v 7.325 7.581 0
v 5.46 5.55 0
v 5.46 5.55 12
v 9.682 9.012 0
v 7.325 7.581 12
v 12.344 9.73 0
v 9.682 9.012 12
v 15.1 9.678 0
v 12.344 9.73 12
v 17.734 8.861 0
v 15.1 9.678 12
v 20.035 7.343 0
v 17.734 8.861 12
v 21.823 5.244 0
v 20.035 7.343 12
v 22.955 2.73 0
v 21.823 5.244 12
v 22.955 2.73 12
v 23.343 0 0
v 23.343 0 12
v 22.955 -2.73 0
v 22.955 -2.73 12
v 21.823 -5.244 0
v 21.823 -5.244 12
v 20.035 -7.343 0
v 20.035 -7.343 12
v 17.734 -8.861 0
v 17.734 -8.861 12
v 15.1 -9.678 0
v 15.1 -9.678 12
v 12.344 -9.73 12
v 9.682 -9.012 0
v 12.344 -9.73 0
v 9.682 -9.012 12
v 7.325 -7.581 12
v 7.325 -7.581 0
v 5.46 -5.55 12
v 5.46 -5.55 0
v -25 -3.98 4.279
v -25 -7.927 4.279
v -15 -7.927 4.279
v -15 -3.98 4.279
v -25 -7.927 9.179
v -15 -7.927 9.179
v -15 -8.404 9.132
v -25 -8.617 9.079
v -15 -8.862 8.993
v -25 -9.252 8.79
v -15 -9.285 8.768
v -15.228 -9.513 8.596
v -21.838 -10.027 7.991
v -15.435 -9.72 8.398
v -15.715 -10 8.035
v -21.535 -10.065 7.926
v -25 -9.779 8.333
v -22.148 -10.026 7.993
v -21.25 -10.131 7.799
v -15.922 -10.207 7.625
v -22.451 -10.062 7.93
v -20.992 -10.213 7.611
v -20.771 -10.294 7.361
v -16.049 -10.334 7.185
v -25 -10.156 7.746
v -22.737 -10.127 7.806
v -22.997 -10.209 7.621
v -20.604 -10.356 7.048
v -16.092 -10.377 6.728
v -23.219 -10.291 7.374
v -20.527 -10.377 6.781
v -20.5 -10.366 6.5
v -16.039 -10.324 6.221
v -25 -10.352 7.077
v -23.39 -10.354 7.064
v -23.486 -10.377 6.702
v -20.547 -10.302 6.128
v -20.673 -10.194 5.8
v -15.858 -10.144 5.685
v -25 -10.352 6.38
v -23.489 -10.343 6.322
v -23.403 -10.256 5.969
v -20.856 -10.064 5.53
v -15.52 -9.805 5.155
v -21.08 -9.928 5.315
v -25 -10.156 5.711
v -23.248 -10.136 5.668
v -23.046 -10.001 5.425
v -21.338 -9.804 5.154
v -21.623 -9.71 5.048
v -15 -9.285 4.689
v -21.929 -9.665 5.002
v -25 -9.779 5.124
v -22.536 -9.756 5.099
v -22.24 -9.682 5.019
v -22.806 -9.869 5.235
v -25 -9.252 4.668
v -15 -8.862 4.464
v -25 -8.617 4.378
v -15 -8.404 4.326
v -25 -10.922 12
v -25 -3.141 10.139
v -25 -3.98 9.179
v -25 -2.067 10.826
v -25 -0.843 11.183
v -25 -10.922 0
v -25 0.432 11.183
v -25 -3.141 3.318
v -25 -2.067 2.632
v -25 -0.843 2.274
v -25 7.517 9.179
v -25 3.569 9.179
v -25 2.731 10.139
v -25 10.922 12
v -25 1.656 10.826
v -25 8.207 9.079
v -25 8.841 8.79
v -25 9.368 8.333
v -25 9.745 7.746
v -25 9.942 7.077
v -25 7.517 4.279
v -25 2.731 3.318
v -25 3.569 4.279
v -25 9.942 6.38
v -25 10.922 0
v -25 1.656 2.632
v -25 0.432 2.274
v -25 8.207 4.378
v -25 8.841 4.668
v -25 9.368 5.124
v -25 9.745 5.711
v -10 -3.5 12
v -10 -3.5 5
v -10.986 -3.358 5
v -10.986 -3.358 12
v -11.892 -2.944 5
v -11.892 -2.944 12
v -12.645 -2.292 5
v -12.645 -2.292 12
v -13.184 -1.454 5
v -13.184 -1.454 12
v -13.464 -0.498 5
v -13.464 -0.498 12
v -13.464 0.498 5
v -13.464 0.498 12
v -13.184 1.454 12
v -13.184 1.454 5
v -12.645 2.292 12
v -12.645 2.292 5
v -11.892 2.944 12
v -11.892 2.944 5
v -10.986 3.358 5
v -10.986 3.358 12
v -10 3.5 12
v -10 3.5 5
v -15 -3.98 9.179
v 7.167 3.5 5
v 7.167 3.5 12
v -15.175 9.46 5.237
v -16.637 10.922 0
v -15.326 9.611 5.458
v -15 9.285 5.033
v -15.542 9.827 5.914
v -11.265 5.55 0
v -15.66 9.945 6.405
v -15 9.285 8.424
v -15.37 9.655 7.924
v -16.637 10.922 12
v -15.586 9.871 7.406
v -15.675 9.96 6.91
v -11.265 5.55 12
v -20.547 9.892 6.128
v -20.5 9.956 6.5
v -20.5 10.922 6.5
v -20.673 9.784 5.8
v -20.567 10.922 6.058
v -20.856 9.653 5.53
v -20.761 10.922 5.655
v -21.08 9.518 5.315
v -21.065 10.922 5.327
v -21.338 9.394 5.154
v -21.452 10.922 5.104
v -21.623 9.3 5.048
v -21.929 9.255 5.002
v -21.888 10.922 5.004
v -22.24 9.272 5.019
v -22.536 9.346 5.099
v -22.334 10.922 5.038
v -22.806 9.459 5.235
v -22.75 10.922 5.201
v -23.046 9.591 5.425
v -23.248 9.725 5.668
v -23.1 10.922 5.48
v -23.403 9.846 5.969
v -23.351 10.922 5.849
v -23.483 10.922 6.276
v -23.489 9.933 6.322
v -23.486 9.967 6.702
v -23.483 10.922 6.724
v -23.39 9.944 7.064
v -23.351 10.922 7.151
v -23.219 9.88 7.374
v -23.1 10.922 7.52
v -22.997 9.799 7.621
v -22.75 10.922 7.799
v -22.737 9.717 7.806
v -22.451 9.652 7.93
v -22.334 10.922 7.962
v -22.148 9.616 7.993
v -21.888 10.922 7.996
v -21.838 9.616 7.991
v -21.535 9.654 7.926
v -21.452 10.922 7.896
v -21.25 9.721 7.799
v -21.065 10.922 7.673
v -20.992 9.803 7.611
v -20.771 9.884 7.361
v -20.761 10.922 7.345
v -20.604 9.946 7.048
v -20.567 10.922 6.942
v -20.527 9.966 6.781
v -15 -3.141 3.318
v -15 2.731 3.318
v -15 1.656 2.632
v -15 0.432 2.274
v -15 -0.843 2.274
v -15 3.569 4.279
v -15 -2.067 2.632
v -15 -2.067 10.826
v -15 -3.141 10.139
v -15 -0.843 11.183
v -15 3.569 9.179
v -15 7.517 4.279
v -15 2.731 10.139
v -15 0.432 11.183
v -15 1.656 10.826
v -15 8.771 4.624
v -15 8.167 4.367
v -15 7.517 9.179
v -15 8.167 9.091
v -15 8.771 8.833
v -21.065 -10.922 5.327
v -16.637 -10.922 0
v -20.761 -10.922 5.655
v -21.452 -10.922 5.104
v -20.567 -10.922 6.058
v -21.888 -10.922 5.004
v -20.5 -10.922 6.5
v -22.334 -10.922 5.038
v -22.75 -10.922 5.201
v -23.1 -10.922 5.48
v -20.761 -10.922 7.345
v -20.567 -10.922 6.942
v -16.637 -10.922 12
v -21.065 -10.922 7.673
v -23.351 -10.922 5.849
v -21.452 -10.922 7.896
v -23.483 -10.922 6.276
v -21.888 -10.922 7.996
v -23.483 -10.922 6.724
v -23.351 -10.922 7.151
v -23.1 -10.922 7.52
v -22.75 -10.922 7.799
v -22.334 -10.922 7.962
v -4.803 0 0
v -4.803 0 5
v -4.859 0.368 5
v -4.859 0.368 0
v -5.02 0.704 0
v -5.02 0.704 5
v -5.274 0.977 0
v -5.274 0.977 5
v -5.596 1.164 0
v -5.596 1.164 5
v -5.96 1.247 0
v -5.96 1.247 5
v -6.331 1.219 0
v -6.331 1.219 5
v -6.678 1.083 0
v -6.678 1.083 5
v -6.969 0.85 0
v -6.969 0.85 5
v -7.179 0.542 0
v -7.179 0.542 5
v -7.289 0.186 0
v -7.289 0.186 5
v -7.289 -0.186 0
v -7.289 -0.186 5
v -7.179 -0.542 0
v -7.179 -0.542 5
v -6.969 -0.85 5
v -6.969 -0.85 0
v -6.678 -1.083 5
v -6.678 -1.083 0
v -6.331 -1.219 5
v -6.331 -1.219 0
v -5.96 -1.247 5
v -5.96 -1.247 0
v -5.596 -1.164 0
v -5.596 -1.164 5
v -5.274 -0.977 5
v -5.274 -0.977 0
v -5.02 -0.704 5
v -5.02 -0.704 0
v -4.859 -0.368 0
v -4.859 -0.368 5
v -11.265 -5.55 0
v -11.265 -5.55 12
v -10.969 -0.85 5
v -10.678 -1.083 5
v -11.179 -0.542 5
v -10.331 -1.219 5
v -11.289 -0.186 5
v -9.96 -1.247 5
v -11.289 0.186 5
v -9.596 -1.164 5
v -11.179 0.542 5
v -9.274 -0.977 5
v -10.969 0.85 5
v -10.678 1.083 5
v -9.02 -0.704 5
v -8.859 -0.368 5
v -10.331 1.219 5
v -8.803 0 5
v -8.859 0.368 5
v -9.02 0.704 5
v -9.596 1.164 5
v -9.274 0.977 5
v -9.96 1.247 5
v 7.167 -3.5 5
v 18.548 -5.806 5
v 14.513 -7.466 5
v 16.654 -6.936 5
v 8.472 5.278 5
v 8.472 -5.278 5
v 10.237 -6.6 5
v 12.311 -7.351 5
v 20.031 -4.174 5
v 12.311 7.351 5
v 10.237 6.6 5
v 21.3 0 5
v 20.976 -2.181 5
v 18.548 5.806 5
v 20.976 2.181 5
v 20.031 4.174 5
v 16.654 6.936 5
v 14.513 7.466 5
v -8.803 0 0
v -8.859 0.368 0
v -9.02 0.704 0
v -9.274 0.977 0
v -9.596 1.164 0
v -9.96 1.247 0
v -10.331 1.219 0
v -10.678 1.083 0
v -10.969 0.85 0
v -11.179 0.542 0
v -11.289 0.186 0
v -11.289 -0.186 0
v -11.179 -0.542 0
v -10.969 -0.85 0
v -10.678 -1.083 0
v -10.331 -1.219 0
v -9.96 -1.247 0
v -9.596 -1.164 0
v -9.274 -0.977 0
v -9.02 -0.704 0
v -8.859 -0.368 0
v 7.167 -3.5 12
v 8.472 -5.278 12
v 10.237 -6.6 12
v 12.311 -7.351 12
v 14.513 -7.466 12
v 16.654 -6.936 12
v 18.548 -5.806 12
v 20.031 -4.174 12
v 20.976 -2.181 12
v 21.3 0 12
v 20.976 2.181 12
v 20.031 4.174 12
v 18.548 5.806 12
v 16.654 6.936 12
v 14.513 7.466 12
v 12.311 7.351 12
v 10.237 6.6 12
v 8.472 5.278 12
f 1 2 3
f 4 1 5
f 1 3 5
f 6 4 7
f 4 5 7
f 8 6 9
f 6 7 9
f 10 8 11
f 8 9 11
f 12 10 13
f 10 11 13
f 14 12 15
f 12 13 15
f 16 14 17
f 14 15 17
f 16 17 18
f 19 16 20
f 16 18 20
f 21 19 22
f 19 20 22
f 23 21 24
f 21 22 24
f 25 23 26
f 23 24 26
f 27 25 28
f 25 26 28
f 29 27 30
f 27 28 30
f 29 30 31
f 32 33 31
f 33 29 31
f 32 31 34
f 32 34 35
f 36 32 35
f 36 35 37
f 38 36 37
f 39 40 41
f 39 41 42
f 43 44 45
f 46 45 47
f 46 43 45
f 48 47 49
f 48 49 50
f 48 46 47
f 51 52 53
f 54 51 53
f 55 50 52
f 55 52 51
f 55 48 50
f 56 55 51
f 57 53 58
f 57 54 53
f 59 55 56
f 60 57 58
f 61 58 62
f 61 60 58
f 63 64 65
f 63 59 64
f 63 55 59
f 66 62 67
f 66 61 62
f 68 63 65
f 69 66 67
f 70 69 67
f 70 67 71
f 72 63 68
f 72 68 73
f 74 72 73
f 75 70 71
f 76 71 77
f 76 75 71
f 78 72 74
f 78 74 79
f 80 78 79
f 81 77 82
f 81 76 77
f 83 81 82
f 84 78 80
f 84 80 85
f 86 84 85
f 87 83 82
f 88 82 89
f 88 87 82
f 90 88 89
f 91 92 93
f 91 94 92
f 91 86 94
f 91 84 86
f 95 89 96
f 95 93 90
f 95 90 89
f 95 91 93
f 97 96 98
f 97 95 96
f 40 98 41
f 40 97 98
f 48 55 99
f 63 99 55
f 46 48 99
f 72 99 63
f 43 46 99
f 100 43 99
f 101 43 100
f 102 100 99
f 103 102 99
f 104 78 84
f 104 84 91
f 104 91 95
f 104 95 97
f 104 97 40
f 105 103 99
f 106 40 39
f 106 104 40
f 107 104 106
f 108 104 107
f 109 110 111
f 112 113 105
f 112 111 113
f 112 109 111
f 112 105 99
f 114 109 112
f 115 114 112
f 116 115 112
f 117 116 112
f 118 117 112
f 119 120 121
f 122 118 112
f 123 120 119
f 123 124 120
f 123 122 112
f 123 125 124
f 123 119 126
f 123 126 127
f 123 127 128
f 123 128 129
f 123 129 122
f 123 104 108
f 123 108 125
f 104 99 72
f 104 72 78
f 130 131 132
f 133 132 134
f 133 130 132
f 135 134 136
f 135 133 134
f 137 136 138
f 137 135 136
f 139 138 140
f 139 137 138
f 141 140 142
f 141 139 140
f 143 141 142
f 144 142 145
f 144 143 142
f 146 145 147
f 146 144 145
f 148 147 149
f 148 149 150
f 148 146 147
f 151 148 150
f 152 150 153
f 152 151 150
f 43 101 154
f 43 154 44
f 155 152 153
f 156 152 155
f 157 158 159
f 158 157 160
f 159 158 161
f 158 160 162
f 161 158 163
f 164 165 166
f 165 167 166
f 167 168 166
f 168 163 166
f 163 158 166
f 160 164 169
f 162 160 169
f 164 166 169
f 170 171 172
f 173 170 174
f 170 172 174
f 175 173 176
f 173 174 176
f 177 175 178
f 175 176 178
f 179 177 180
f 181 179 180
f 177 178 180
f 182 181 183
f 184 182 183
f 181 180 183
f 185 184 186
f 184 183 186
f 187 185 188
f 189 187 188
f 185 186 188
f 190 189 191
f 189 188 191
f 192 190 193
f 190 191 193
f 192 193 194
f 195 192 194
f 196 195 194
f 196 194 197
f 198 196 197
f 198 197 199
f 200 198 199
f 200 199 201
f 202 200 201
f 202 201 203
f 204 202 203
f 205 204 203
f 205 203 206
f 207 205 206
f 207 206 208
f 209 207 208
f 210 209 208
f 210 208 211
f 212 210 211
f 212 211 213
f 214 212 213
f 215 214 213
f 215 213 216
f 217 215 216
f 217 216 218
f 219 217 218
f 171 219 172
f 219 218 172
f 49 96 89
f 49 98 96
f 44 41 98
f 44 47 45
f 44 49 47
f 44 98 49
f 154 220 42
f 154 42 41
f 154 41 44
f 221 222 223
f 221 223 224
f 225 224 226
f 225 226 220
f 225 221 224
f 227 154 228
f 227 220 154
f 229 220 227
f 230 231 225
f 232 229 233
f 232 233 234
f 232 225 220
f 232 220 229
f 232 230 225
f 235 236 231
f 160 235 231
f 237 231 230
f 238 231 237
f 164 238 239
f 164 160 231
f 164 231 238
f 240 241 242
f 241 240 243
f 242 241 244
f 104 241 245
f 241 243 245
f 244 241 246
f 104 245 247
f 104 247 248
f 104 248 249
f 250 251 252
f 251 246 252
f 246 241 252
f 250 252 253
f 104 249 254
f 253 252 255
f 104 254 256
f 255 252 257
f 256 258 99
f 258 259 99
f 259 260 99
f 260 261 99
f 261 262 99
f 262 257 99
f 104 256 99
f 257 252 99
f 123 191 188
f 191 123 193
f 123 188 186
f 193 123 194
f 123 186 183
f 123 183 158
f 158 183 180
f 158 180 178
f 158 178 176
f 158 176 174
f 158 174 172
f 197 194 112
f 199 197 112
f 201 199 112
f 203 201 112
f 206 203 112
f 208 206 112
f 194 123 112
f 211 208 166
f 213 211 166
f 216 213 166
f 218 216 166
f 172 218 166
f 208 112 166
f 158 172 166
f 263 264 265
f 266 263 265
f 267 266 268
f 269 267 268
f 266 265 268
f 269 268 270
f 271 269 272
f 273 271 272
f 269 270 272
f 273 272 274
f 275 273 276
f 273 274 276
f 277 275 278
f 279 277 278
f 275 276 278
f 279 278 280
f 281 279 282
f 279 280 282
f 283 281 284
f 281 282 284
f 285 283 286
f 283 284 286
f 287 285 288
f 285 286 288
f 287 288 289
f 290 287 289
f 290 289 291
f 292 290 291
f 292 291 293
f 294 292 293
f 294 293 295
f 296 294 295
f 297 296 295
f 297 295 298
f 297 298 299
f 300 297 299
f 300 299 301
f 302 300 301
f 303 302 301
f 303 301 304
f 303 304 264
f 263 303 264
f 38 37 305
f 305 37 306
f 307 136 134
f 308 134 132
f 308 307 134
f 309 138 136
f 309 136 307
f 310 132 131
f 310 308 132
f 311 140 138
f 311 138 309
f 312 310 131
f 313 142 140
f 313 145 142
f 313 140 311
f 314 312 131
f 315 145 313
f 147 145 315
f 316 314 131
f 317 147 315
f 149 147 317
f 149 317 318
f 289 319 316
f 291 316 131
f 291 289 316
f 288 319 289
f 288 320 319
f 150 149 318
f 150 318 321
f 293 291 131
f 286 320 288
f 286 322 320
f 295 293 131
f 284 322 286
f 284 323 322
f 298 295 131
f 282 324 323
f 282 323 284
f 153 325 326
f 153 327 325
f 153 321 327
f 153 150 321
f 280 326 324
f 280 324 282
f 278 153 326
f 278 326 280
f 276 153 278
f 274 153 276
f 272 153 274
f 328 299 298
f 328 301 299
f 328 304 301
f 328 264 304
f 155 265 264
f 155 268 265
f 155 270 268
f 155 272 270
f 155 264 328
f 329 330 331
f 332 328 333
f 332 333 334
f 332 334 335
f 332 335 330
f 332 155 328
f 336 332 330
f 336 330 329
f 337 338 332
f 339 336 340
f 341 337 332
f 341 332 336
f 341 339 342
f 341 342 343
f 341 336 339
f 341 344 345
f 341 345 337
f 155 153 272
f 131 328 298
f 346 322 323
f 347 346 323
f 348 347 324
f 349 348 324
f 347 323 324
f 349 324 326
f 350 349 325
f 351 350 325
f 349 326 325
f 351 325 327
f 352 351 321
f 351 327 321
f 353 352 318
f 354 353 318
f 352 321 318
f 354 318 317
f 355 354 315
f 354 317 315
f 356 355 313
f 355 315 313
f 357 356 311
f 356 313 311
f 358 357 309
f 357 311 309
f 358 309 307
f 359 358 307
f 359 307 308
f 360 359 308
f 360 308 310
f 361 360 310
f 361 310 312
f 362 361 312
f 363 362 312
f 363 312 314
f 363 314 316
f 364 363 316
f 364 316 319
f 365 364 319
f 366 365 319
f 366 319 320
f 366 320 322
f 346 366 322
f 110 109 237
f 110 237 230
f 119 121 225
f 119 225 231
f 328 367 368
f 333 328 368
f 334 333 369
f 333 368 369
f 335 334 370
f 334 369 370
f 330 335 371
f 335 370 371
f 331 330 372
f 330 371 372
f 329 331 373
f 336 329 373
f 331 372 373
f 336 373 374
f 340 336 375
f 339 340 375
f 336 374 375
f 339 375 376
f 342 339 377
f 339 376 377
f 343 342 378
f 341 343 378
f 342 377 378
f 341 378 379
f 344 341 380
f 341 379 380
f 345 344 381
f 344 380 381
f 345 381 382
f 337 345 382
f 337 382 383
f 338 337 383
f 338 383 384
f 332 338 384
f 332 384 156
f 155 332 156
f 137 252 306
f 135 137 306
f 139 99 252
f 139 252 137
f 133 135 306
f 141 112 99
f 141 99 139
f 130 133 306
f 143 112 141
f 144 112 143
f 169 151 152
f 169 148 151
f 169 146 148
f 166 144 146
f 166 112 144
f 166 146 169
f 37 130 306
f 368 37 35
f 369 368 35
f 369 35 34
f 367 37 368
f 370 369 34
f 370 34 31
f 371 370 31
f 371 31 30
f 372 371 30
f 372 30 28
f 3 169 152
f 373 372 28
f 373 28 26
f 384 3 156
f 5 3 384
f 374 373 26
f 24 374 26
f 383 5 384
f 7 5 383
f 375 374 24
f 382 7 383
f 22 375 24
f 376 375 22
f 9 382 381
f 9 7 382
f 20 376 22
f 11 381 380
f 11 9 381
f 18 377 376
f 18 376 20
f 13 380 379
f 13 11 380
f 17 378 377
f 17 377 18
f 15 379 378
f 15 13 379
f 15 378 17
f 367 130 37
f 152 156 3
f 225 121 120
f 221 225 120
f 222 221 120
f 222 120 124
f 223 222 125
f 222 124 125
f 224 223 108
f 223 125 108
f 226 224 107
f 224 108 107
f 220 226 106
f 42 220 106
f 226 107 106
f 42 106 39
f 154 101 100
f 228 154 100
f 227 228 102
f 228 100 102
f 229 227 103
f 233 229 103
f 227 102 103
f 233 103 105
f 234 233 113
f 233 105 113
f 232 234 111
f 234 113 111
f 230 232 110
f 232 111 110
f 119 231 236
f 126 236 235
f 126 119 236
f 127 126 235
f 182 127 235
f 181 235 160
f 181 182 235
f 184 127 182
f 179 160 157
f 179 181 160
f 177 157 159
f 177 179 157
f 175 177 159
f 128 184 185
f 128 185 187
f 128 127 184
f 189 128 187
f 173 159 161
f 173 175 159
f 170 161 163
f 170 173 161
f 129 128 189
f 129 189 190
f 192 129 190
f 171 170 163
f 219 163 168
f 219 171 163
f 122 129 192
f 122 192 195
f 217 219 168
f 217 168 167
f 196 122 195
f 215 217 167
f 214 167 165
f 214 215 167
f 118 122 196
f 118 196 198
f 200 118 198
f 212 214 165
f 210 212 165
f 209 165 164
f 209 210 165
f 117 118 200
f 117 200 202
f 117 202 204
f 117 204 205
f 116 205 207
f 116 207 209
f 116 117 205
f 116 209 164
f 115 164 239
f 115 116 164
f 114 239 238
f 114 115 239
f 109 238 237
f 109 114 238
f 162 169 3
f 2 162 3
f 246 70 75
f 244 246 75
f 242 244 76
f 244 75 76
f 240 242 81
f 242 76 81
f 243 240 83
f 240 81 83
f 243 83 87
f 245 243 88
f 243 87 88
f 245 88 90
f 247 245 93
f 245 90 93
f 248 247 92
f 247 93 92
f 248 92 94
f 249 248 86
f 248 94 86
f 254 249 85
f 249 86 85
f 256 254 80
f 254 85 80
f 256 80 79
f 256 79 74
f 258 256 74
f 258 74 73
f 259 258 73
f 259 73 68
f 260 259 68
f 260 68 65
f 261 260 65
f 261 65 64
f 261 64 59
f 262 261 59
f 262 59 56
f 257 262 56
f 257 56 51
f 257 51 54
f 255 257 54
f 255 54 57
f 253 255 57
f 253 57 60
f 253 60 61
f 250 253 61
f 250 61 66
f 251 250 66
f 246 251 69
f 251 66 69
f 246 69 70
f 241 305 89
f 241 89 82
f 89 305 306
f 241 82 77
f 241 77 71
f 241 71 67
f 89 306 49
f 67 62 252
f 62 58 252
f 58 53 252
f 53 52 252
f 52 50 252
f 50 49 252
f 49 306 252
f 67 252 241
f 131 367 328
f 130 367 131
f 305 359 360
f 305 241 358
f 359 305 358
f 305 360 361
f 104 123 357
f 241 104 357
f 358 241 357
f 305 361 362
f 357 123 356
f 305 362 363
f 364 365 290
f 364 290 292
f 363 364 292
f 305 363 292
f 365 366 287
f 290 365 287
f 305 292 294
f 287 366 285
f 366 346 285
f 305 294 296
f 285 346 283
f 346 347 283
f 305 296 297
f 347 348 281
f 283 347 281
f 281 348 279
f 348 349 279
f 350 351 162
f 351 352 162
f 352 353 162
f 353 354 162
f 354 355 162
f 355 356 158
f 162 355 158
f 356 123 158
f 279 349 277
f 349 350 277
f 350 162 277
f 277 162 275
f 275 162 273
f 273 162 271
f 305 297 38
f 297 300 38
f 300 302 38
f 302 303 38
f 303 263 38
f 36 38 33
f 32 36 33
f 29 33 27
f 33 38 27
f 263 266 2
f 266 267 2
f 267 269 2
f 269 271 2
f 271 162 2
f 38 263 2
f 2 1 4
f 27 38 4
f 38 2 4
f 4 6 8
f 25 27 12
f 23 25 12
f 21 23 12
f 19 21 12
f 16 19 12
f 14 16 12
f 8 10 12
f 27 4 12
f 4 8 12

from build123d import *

# Parameters (mm, degrees)
SKETCH1_W           = 50
SKETCH1_H           = 30
BOSS_EXTRUDE1_DEPTH = 15
SKETCH2_R           = 4.5
CUT_EXTRUDE1_DEPTH  = 10
SKETCH4_R           = 7.5
CUT_EXTRUDE3_DEPTH  = 10
SKETCH5_R           = 1.25
CUT_EXTRUDE4_DEPTH  = 10
SKETCH7_W           = 50
SKETCH7_H           = 30
CUT_EXTRUDE5_DEPTH  = 3
CUT_EXTRUDE6_DEPTH  = 13
SKETCH9_R           = 1.5
CUT_EXTRUDE7_DEPTH  = 23


with BuildPart() as part:
    # Sketch1 → Boss-Extrude1 (new body)
    with BuildSketch(Plane.XY):
        Rectangle(SKETCH1_W, SKETCH1_H)
    extrude(amount=BOSS_EXTRUDE1_DEPTH)

    # Sketch2 → Cut-Extrude1 (cut)
    with BuildSketch(Plane.ZY.offset(25)):
        with Locations((6.728688525, -0.205173042)):
            Circle(SKETCH2_R)
        with BuildLine():
            Line((9.178688525, 7.516794171), (9.178688525, -7.927140255))
            ThreePointArc((9.178688525, -7.927140255), (6.728688525, -10.377140255), (4.278688525, -7.927140255))
            Line((4.278688525, -7.927140255), (4.278688525, 7.516794171))
            ThreePointArc((4.278688525, 7.516794171), (6.728688525, 9.966794171), (9.178688525, 7.516794171))
        make_face()
    extrude(amount=-CUT_EXTRUDE1_DEPTH, mode=Mode.SUBTRACT)

    # Sketch4 → Cut-Extrude3 (cut)
    with BuildSketch(Plane.XY.offset(15)):
        with Locations((13.8, 0)):
            Circle(SKETCH4_R)
        with BuildLine():
            Line((-10, 3.5), (13.8, 3.5))
            ThreePointArc((13.8, 3.5), (17.3, 0), (13.8, -3.5))
            Line((13.8, -3.5), (-10, -3.5))
            ThreePointArc((-10, -3.5), (-13.5, 0), (-10, 3.5))
        make_face()
    extrude(amount=-CUT_EXTRUDE3_DEPTH, mode=Mode.SUBTRACT)

    # Sketch5 → Cut-Extrude4 (cut)
    with BuildSketch(Plane.XY.offset(5)):
        with Locations((-10.053055142, 0)):
            Circle(SKETCH5_R)
        with Locations((-6.053055142, 0)):
            Circle(SKETCH5_R)
    extrude(amount=-CUT_EXTRUDE4_DEPTH, mode=Mode.SUBTRACT)

    # Sketch7 → Cut-Extrude5 (cut)
    with BuildSketch(Plane.XY.offset(15)):
        Rectangle(SKETCH7_W, SKETCH7_H)
    extrude(amount=-CUT_EXTRUDE5_DEPTH, mode=Mode.SUBTRACT)

    # Sketch8 → Cut-Extrude6 (cut)
    with BuildSketch(Plane.XY.offset(12)):
        with BuildLine():
            Line((-25, 15), (-25, 10.92225852))
            Line((-25, 10.92225852), (-16.637103876, 10.92225852))
            Line((-16.637103876, 10.92225852), (-11.26502882, 5.550183464))
            Line((-11.26502882, 5.550183464), (5.459842894, 5.550183464))
            ThreePointArc((5.459842894, 5.550183464), (23.343165243, 0), (5.459842894, -5.550183464))
            Line((5.459842894, -5.550183464), (-11.26502882, -5.550183464))
            Line((-11.26502882, -5.550183464), (-16.637103876, -10.92225852))
            Line((-16.637103876, -10.92225852), (-25, -10.92225852))
            Line((-25, -10.92225852), (-25, -15))
            Line((-25, -15), (25, -15))
            Line((25, -15), (25, 15))
            Line((25, 15), (-25, 15))
        make_face()
    extrude(amount=-CUT_EXTRUDE6_DEPTH, mode=Mode.SUBTRACT)

    # Sketch9 → Cut-Extrude7 (cut)
    with BuildSketch(Plane(origin=(0, 10.92225852, 0), x_dir=(1, 0, 0), z_dir=(0, 1, 0))):
        with Locations((-22, -6.5)):
            Circle(SKETCH9_R)
    extrude(amount=-CUT_EXTRUDE7_DEPTH, mode=Mode.SUBTRACT)


solid = part.part
